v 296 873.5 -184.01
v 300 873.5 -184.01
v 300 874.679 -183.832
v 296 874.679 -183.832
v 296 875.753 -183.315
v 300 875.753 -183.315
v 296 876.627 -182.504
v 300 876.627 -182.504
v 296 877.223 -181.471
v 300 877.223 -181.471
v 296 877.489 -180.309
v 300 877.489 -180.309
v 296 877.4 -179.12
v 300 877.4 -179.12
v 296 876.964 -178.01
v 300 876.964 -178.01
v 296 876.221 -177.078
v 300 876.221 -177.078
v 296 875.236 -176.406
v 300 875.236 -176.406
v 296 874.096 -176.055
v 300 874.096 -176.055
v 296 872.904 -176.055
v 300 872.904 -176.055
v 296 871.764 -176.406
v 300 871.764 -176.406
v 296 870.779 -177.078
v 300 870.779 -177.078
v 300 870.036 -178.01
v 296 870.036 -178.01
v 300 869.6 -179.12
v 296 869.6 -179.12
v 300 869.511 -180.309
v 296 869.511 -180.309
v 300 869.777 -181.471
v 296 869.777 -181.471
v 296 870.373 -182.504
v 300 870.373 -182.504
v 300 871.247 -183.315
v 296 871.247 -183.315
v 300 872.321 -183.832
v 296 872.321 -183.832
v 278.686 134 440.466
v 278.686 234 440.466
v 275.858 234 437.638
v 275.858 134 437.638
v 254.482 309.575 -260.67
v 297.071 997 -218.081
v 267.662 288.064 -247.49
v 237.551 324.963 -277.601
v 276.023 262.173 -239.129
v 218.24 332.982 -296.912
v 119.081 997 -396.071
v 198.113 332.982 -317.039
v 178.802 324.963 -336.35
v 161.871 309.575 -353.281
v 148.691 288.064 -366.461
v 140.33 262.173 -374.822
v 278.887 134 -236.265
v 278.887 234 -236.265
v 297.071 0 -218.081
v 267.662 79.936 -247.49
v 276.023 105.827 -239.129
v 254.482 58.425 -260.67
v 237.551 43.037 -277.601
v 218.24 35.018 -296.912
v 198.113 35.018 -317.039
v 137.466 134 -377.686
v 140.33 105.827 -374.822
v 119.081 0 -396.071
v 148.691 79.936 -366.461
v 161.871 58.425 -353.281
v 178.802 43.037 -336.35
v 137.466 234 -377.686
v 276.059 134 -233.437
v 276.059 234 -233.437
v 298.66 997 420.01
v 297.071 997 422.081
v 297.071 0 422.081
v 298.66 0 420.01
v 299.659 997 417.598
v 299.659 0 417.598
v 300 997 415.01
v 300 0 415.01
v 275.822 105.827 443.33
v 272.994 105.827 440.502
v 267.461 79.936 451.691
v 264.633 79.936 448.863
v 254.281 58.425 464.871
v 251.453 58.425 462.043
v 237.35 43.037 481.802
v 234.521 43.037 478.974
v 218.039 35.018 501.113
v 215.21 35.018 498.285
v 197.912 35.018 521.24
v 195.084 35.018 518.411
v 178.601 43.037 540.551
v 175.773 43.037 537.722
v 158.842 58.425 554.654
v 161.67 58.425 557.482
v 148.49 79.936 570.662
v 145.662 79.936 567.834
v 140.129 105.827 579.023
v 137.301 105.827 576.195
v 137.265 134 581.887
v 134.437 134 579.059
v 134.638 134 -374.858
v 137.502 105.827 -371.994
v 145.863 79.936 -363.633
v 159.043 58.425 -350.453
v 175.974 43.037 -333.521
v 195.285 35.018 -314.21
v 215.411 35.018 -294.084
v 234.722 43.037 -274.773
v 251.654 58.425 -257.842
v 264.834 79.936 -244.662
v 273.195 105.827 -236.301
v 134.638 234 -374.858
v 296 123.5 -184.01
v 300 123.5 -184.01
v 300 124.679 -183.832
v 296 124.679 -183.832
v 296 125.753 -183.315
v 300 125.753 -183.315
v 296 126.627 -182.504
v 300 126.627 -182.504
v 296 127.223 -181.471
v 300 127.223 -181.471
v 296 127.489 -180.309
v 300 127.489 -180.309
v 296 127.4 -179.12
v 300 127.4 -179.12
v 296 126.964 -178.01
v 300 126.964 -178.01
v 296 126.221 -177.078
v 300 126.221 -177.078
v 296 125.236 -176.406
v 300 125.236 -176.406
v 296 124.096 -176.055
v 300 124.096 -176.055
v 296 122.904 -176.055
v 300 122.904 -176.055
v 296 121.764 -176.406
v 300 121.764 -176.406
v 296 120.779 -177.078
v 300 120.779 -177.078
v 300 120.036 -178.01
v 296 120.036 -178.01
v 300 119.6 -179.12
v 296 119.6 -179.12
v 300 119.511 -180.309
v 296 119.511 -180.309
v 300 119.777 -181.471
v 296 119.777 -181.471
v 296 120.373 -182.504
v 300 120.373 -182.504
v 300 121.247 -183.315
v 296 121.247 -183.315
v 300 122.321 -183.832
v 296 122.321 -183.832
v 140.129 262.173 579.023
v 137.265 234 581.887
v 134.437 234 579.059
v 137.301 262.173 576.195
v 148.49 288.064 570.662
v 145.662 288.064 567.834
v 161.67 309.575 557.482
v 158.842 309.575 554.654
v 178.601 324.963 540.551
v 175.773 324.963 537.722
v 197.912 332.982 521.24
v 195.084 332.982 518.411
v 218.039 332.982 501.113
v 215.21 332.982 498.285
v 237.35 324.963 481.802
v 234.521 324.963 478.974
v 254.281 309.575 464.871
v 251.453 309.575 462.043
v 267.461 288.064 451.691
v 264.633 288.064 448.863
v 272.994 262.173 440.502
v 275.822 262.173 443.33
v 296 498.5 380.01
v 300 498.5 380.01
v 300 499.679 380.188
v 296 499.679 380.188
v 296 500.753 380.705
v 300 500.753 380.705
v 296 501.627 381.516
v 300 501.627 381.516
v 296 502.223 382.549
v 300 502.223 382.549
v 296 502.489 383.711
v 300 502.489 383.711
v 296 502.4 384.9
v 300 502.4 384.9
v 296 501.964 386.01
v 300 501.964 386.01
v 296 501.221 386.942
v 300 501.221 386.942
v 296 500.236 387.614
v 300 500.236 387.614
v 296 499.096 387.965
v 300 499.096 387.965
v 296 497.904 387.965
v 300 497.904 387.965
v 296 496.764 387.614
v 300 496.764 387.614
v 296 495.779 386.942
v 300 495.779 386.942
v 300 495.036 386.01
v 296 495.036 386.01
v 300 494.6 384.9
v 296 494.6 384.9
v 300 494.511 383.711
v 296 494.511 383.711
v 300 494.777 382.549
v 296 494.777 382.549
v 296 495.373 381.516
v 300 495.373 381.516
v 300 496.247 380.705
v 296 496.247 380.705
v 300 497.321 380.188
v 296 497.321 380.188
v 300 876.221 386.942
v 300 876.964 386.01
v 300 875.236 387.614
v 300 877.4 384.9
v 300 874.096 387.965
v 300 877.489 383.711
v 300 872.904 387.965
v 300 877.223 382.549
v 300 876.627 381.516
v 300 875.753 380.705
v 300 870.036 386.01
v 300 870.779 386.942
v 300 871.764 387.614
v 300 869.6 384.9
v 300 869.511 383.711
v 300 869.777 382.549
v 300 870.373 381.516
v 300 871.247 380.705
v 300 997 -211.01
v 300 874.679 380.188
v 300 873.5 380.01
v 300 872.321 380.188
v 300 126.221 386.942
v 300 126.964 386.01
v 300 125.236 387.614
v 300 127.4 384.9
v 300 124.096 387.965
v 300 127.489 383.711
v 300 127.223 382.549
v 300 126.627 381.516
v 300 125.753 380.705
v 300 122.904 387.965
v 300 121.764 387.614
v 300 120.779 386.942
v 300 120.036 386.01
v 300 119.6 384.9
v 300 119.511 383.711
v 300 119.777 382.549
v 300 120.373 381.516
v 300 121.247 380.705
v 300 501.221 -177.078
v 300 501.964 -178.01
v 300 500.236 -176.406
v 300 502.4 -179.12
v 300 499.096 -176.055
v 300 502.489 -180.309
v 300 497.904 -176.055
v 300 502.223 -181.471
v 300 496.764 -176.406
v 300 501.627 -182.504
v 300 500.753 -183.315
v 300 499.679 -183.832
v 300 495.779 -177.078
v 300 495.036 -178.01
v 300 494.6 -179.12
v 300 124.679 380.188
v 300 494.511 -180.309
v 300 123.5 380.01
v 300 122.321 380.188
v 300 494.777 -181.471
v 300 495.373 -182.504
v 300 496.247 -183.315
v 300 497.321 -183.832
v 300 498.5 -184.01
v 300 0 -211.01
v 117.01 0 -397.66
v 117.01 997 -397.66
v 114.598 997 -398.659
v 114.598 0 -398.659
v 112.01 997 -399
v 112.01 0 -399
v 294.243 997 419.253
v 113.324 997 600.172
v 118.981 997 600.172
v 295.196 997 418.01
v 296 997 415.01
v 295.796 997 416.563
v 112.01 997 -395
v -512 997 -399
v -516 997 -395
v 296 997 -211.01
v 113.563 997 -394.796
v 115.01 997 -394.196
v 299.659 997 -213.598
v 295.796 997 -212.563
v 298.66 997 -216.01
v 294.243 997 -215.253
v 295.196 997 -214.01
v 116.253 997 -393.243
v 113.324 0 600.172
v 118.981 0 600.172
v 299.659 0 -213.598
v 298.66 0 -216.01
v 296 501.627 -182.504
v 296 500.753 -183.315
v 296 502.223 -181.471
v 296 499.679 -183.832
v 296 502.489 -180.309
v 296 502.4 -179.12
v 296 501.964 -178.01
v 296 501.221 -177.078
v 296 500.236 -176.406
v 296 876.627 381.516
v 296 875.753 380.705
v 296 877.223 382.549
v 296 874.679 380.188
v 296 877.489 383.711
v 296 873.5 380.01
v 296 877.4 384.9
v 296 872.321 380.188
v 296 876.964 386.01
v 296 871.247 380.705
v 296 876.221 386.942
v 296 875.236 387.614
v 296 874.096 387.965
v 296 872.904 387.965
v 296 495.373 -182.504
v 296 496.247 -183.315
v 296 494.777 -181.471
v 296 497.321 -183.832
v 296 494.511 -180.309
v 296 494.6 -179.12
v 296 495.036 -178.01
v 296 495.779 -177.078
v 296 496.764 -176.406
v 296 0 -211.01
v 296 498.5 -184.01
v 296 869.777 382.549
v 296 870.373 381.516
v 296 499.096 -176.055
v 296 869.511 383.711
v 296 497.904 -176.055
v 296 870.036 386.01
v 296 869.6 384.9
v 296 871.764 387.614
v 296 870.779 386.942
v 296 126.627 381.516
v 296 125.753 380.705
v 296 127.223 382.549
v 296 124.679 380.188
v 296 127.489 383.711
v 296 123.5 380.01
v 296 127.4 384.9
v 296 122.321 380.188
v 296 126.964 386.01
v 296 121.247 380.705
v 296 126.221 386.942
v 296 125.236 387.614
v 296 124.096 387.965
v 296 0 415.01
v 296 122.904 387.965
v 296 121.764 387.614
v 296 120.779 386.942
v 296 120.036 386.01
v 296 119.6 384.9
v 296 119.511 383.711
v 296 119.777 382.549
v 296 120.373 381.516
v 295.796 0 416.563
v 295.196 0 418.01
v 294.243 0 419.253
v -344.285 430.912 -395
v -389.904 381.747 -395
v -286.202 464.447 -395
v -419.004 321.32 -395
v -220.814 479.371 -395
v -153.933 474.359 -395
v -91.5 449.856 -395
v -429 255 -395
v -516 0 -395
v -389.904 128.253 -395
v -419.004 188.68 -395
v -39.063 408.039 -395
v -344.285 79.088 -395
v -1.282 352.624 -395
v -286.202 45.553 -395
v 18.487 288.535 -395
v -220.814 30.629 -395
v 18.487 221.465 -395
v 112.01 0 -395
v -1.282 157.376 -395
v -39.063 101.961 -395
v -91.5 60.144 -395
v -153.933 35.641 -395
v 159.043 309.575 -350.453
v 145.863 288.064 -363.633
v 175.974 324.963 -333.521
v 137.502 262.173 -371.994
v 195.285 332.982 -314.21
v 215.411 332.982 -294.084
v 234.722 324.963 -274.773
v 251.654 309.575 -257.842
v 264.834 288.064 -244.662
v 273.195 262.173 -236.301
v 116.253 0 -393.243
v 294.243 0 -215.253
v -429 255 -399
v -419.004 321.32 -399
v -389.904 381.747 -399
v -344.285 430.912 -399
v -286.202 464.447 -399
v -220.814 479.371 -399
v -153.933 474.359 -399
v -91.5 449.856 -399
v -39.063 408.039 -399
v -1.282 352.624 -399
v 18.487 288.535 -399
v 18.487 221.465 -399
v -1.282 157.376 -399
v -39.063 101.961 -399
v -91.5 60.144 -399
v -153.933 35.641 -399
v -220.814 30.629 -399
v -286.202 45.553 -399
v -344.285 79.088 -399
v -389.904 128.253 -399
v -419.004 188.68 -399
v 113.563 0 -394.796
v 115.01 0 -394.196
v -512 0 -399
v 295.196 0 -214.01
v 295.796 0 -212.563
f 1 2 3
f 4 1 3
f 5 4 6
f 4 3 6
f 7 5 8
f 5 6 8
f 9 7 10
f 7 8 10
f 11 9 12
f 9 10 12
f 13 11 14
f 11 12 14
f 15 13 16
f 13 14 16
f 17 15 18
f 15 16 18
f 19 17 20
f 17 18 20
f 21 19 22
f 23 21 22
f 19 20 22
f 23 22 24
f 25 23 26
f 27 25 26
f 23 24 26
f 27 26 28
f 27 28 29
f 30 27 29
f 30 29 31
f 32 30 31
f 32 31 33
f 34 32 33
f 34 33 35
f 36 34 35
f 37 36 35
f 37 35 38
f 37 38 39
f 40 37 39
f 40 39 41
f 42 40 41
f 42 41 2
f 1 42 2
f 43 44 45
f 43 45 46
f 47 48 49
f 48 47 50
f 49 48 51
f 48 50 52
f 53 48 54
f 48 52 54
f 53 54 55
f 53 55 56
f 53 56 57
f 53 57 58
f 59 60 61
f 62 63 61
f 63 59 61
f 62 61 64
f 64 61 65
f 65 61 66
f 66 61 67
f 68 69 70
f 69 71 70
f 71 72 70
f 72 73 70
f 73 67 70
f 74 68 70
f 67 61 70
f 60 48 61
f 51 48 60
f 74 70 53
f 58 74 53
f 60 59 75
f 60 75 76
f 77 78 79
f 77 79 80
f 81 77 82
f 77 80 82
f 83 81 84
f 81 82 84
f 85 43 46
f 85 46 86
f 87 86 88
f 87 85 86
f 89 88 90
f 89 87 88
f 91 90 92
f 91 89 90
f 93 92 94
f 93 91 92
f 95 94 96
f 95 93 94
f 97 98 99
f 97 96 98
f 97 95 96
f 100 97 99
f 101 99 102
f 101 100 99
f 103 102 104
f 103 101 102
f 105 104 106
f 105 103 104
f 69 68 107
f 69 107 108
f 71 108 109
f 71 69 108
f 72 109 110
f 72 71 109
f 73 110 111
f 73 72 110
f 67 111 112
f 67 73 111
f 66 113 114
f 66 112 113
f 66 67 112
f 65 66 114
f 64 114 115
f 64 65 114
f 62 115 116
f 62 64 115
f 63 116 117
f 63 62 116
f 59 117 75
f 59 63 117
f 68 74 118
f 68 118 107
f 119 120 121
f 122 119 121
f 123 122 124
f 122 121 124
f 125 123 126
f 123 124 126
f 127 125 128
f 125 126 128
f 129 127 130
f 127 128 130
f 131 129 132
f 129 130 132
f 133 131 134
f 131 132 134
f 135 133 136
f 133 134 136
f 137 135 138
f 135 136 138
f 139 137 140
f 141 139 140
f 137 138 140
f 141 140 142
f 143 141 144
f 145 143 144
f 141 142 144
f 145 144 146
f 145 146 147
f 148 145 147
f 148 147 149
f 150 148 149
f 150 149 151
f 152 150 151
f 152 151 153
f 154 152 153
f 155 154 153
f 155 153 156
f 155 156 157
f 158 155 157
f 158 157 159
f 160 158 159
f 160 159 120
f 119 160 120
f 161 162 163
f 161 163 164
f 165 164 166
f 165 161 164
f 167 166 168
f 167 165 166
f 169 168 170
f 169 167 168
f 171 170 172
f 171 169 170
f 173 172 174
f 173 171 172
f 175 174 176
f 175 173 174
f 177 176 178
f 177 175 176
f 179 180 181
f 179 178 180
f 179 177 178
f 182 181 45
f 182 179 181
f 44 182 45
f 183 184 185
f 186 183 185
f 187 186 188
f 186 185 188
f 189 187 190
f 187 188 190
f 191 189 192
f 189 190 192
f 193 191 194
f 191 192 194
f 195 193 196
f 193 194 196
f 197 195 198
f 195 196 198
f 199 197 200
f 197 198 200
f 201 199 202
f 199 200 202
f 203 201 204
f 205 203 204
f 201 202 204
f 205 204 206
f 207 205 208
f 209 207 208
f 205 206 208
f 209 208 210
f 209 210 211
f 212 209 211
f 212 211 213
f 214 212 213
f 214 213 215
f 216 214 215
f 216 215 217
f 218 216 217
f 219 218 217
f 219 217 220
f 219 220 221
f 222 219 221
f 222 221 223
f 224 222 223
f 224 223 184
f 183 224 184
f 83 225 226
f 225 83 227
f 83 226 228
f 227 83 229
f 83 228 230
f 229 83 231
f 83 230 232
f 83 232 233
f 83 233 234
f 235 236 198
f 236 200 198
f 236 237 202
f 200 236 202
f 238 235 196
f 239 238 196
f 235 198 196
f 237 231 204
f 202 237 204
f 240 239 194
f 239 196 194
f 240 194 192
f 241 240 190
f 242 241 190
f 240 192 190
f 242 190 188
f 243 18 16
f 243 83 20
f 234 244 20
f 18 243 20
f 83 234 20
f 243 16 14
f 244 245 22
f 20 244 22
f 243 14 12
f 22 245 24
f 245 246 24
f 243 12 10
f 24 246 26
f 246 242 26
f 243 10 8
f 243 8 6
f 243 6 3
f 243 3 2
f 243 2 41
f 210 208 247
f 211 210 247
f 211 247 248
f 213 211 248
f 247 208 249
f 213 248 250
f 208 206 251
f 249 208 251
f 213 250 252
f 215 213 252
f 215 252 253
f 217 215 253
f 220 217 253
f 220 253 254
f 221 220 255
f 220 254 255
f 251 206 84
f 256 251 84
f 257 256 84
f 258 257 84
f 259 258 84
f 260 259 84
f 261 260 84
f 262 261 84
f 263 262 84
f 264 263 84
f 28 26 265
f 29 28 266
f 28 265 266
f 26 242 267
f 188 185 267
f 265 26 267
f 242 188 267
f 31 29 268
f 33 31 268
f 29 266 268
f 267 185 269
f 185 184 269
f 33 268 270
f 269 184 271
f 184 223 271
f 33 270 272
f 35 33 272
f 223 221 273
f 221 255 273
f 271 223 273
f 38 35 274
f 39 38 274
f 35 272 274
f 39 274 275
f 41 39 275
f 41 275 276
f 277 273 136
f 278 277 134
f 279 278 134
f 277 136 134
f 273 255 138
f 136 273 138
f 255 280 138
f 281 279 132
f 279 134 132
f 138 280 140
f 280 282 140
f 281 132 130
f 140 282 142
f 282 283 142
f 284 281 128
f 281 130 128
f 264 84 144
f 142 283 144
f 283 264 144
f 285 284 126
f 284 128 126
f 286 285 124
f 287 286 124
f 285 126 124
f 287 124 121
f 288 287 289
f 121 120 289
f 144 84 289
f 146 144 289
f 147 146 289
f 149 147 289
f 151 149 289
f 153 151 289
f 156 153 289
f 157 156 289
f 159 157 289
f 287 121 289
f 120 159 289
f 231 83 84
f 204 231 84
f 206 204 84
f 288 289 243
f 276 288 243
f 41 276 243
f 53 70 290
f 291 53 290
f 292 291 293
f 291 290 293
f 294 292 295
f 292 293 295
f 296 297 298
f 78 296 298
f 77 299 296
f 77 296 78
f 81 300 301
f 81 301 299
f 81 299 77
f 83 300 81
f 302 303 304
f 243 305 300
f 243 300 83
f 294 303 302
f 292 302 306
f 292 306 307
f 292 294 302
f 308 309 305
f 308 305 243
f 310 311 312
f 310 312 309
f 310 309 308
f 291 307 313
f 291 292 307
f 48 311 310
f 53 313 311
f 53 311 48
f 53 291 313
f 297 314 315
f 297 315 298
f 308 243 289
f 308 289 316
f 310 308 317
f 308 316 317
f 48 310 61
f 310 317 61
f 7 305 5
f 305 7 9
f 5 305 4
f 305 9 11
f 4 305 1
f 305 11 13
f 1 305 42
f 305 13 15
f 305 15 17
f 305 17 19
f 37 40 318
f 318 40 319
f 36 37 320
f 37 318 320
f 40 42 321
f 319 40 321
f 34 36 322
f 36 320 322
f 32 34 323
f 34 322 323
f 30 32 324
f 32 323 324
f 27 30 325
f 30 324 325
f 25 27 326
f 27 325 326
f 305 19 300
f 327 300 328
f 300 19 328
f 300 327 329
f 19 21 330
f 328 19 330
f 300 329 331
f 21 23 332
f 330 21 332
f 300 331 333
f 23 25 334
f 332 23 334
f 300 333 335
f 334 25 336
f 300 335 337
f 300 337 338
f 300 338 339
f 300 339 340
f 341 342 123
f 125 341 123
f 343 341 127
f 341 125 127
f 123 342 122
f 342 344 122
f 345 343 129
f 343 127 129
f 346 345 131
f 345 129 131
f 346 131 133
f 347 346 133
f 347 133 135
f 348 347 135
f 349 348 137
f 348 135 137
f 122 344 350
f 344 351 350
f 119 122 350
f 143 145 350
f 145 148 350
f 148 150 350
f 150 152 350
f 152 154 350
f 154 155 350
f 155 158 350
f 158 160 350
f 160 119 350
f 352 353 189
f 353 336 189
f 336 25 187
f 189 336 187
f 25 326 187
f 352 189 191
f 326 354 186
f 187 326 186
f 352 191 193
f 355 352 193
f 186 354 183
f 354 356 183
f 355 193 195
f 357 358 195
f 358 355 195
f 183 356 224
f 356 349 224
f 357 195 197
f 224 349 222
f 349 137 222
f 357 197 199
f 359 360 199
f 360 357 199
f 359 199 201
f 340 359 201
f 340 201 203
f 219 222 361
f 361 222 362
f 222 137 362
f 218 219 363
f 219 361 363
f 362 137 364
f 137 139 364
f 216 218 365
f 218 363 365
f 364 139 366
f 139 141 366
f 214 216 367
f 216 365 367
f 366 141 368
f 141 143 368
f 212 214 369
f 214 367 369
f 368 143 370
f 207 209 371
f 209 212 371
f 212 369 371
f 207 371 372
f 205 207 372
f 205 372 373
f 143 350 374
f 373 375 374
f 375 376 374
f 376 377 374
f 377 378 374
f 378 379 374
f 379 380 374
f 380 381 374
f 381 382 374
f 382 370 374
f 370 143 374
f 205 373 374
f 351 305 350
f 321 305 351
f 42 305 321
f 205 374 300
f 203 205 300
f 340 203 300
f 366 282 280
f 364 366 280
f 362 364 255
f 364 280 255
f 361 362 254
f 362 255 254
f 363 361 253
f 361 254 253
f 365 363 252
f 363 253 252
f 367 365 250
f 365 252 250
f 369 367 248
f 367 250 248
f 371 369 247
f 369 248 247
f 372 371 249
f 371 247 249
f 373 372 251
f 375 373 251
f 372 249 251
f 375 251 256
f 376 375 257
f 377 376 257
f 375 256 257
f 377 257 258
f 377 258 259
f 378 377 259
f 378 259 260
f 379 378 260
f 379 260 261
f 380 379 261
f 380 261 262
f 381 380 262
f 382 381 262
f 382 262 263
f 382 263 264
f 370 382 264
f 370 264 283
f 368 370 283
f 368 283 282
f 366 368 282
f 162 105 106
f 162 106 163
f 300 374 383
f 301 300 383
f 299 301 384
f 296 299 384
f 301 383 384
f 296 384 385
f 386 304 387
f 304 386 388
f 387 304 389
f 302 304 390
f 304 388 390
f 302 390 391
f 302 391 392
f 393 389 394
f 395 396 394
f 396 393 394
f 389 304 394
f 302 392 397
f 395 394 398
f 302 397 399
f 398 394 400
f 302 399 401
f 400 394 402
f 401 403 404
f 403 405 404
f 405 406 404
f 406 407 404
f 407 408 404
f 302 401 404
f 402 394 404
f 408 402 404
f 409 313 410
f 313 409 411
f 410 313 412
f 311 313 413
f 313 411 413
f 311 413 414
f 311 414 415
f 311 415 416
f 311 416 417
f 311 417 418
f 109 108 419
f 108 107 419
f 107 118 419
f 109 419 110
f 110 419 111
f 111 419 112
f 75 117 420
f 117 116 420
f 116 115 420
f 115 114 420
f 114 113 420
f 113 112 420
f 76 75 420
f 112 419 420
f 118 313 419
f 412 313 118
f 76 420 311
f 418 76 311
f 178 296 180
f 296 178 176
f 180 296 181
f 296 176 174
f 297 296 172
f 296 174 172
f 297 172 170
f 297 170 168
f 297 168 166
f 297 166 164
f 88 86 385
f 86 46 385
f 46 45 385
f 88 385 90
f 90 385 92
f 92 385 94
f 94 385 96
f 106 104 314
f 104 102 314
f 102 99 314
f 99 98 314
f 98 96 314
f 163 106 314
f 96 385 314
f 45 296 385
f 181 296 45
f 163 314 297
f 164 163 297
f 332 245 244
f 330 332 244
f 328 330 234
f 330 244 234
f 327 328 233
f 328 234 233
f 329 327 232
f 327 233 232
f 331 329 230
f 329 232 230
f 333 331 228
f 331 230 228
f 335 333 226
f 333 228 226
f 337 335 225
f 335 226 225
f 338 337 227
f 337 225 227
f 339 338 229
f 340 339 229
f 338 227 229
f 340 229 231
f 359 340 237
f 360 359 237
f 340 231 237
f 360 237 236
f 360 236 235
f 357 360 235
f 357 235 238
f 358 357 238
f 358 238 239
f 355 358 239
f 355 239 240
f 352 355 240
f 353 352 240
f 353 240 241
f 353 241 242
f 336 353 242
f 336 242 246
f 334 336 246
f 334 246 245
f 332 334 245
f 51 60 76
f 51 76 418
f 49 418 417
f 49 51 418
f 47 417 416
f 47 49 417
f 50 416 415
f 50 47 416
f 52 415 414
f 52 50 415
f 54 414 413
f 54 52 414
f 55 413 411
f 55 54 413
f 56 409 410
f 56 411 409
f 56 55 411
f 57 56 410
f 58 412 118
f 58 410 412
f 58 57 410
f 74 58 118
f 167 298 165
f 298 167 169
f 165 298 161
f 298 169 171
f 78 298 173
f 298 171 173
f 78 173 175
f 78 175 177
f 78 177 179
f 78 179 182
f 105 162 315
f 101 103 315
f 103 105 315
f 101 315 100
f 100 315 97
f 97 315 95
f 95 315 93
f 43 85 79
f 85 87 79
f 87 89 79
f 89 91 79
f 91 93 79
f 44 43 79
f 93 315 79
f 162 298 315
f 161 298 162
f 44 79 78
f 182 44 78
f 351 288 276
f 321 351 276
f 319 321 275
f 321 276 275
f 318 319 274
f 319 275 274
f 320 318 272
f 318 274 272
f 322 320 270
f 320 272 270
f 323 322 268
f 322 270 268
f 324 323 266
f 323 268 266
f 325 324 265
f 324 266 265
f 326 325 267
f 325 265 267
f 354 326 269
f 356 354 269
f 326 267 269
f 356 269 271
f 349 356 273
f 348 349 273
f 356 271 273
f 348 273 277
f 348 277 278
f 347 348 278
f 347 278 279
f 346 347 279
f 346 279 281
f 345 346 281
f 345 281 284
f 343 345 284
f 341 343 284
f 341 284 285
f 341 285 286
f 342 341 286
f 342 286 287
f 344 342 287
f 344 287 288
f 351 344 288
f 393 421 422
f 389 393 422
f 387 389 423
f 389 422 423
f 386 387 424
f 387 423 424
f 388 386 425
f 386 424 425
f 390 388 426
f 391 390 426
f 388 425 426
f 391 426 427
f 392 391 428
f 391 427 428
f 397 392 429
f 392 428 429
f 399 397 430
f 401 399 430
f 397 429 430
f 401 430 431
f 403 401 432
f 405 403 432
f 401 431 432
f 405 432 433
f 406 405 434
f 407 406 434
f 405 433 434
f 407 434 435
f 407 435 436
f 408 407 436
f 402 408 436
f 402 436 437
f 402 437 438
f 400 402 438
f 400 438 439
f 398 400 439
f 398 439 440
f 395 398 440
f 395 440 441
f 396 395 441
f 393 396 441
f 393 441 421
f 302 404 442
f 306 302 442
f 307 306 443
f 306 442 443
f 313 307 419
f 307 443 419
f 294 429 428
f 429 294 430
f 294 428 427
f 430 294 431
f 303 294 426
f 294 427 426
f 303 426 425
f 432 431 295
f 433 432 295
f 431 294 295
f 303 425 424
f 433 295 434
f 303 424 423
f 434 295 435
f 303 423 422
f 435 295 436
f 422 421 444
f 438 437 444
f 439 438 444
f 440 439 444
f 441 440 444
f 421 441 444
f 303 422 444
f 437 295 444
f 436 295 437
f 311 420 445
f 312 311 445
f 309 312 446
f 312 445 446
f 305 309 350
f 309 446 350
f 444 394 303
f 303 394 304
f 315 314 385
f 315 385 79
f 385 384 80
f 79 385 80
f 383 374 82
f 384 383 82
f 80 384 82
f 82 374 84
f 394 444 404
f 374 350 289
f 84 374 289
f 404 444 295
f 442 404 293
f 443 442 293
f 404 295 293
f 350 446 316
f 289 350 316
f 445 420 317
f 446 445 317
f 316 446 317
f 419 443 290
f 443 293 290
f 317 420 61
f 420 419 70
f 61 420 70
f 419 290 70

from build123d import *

# Parameters (mm, degrees)
BASE_FLANGE1_DEPTH   = 997
CUT_EXTRUDE1_DEPTH   = 10
SKETCH7_R            = 225
CUT_EXTRUDE2_DEPTH   = 10
SKETCH8_R            = 4
CUT_EXTRUDE3_DEPTH   = 10
CUT_EXTRUDE4_DEPTH   = 10
LPATTERN1_COUNT      = 3
LPATTERN1_PITCH      = 375
LPATTERN1_COUNT_DIR2 = 2
LPATTERN1_PITCH_DIR2 = 564.02
CHAMFER1_SIZE        = 4


# Sheet-metal steps are written as plain solids
with BuildPart() as part:
    # Sketch1 → Base-Flange1 (new body)
    with BuildSketch(Plane(origin=(0, 0, 0), x_dir=(1, 0, 0), z_dir=(0, 1, 0))):
        with BuildLine():
            Line((116.152236891, -603), (297.071067812, -422.08116908))
            ThreePointArc((297.071067812, -422.08116908), (299.238795325, -418.836935591), (300, -415.010101268))
            Line((300, -415.010101268), (300, 211.010101268))
            ThreePointArc((300, 211.010101268), (299.238795325, 214.836935591), (297.071067812, 218.08116908))
            Line((297.071067812, 218.08116908), (119.08116908, 396.071067812))
            ThreePointArc((119.08116908, 396.071067812), (115.836935591, 398.238795325), (112.010101268, 399))
            Line((112.010101268, 399), (-516, 399))
            Line((-516, 399), (-516, 395))
            Line((-516, 395), (112.010101268, 395))
            ThreePointArc((112.010101268, 395), (114.306201862, 394.543277195), (116.252741955, 393.242640687))
            Line((116.252741955, 393.242640687), (294.242640687, 215.252741955))
            ThreePointArc((294.242640687, 215.252741955), (295.543277195, 213.306201862), (296, 211.010101268))
            Line((296, 211.010101268), (296, -415.010101268))
            ThreePointArc((296, -415.010101268), (295.543277195, -417.306201862), (294.242640687, -419.252741955))
            Line((294.242640687, -419.252741955), (113.323809767, -600.171572875))
            Line((113.323809767, -600.171572875), (116.152236891, -603))
        make_face()
    extrude(amount=BASE_FLANGE1_DEPTH)

    # Sketch6 → Cut-Extrude1 (cut)
    with BuildSketch(Plane(origin=(257.576118446, 0, -257.576118446), x_dir=(-0.7071067811865485, 0, -0.7071067811865466), z_dir=(0.7071067811865466, 0, -0.7071067811865485))):
        with BuildLine():
            Line((-30.138564286, 134), (-30.138564286, 234))
            ThreePointArc((-30.138564286, 234), (69.861435714, 334), (169.861435714, 234))
            Line((169.861435714, 234), (169.861435714, 134))
            ThreePointArc((169.861435714, 134), (69.861435714, 34), (-30.138564286, 134))
        make_face()
    extrude(amount=-CUT_EXTRUDE1_DEPTH, mode=Mode.SUBTRACT)

    # Sketch7 → Cut-Extrude2 (cut)
    with BuildSketch(Plane(origin=(0, 0, -399), x_dir=(-1, 0, 0), z_dir=(0, 0, -1))):
        with Locations((204, 255)):
            Circle(SKETCH7_R)
    extrude(amount=-CUT_EXTRUDE2_DEPTH, mode=Mode.SUBTRACT)

    # Sketch8 → Cut-Extrude3 (cut)
    with BuildSketch(Plane(origin=(300, 0, 0), x_dir=(0, 0, -1), z_dir=(1, 0, 0))):
        with Locations((180.010101268, 873.5)):
            Circle(SKETCH8_R)
    cut_extrude3 = extrude(amount=-CUT_EXTRUDE3_DEPTH, mode=Mode.SUBTRACT)

    # Sketch9 → Cut-Extrude4 (cut)
    with BuildSketch(Plane(origin=(359.576118446, 0, 359.576118446), x_dir=(0.7071067811865415, 0, -0.7071067811865536), z_dir=(0.7071067811865536, 0, 0.7071067811865415))):
        with BuildLine():
            Line((-314.395490323, 134), (-314.395490323, 234))
            ThreePointArc((-314.395490323, 234), (-214.395490323, 334), (-114.395490323, 234))
            Line((-114.395490323, 234), (-114.395490323, 134))
            ThreePointArc((-114.395490323, 134), (-214.395490323, 34), (-314.395490323, 134))
        make_face()
    extrude(amount=-CUT_EXTRUDE4_DEPTH, mode=Mode.SUBTRACT)

    # LPattern1: Cut-Extrude3 3 × 2
    with Locations(*[(0, -i * LPATTERN1_PITCH, j * LPATTERN1_PITCH_DIR2) for i in range(LPATTERN1_COUNT) for j in range(LPATTERN1_COUNT_DIR2) if (i, j) != (0, 0)]):
        add(cut_extrude3, mode=Mode.SUBTRACT)

    # Chamfer1
    chamfer1_edges = [part.edges().sort_by_distance(p)[0] for p in [
        (-516, 498.5, -399),
        (116.152236891, 498.5, 603),
    ]]
    chamfer(chamfer1_edges, length=CHAMFER1_SIZE - 0.0001)  # a hair under: the kernel refuses the full size


solid = part.part
